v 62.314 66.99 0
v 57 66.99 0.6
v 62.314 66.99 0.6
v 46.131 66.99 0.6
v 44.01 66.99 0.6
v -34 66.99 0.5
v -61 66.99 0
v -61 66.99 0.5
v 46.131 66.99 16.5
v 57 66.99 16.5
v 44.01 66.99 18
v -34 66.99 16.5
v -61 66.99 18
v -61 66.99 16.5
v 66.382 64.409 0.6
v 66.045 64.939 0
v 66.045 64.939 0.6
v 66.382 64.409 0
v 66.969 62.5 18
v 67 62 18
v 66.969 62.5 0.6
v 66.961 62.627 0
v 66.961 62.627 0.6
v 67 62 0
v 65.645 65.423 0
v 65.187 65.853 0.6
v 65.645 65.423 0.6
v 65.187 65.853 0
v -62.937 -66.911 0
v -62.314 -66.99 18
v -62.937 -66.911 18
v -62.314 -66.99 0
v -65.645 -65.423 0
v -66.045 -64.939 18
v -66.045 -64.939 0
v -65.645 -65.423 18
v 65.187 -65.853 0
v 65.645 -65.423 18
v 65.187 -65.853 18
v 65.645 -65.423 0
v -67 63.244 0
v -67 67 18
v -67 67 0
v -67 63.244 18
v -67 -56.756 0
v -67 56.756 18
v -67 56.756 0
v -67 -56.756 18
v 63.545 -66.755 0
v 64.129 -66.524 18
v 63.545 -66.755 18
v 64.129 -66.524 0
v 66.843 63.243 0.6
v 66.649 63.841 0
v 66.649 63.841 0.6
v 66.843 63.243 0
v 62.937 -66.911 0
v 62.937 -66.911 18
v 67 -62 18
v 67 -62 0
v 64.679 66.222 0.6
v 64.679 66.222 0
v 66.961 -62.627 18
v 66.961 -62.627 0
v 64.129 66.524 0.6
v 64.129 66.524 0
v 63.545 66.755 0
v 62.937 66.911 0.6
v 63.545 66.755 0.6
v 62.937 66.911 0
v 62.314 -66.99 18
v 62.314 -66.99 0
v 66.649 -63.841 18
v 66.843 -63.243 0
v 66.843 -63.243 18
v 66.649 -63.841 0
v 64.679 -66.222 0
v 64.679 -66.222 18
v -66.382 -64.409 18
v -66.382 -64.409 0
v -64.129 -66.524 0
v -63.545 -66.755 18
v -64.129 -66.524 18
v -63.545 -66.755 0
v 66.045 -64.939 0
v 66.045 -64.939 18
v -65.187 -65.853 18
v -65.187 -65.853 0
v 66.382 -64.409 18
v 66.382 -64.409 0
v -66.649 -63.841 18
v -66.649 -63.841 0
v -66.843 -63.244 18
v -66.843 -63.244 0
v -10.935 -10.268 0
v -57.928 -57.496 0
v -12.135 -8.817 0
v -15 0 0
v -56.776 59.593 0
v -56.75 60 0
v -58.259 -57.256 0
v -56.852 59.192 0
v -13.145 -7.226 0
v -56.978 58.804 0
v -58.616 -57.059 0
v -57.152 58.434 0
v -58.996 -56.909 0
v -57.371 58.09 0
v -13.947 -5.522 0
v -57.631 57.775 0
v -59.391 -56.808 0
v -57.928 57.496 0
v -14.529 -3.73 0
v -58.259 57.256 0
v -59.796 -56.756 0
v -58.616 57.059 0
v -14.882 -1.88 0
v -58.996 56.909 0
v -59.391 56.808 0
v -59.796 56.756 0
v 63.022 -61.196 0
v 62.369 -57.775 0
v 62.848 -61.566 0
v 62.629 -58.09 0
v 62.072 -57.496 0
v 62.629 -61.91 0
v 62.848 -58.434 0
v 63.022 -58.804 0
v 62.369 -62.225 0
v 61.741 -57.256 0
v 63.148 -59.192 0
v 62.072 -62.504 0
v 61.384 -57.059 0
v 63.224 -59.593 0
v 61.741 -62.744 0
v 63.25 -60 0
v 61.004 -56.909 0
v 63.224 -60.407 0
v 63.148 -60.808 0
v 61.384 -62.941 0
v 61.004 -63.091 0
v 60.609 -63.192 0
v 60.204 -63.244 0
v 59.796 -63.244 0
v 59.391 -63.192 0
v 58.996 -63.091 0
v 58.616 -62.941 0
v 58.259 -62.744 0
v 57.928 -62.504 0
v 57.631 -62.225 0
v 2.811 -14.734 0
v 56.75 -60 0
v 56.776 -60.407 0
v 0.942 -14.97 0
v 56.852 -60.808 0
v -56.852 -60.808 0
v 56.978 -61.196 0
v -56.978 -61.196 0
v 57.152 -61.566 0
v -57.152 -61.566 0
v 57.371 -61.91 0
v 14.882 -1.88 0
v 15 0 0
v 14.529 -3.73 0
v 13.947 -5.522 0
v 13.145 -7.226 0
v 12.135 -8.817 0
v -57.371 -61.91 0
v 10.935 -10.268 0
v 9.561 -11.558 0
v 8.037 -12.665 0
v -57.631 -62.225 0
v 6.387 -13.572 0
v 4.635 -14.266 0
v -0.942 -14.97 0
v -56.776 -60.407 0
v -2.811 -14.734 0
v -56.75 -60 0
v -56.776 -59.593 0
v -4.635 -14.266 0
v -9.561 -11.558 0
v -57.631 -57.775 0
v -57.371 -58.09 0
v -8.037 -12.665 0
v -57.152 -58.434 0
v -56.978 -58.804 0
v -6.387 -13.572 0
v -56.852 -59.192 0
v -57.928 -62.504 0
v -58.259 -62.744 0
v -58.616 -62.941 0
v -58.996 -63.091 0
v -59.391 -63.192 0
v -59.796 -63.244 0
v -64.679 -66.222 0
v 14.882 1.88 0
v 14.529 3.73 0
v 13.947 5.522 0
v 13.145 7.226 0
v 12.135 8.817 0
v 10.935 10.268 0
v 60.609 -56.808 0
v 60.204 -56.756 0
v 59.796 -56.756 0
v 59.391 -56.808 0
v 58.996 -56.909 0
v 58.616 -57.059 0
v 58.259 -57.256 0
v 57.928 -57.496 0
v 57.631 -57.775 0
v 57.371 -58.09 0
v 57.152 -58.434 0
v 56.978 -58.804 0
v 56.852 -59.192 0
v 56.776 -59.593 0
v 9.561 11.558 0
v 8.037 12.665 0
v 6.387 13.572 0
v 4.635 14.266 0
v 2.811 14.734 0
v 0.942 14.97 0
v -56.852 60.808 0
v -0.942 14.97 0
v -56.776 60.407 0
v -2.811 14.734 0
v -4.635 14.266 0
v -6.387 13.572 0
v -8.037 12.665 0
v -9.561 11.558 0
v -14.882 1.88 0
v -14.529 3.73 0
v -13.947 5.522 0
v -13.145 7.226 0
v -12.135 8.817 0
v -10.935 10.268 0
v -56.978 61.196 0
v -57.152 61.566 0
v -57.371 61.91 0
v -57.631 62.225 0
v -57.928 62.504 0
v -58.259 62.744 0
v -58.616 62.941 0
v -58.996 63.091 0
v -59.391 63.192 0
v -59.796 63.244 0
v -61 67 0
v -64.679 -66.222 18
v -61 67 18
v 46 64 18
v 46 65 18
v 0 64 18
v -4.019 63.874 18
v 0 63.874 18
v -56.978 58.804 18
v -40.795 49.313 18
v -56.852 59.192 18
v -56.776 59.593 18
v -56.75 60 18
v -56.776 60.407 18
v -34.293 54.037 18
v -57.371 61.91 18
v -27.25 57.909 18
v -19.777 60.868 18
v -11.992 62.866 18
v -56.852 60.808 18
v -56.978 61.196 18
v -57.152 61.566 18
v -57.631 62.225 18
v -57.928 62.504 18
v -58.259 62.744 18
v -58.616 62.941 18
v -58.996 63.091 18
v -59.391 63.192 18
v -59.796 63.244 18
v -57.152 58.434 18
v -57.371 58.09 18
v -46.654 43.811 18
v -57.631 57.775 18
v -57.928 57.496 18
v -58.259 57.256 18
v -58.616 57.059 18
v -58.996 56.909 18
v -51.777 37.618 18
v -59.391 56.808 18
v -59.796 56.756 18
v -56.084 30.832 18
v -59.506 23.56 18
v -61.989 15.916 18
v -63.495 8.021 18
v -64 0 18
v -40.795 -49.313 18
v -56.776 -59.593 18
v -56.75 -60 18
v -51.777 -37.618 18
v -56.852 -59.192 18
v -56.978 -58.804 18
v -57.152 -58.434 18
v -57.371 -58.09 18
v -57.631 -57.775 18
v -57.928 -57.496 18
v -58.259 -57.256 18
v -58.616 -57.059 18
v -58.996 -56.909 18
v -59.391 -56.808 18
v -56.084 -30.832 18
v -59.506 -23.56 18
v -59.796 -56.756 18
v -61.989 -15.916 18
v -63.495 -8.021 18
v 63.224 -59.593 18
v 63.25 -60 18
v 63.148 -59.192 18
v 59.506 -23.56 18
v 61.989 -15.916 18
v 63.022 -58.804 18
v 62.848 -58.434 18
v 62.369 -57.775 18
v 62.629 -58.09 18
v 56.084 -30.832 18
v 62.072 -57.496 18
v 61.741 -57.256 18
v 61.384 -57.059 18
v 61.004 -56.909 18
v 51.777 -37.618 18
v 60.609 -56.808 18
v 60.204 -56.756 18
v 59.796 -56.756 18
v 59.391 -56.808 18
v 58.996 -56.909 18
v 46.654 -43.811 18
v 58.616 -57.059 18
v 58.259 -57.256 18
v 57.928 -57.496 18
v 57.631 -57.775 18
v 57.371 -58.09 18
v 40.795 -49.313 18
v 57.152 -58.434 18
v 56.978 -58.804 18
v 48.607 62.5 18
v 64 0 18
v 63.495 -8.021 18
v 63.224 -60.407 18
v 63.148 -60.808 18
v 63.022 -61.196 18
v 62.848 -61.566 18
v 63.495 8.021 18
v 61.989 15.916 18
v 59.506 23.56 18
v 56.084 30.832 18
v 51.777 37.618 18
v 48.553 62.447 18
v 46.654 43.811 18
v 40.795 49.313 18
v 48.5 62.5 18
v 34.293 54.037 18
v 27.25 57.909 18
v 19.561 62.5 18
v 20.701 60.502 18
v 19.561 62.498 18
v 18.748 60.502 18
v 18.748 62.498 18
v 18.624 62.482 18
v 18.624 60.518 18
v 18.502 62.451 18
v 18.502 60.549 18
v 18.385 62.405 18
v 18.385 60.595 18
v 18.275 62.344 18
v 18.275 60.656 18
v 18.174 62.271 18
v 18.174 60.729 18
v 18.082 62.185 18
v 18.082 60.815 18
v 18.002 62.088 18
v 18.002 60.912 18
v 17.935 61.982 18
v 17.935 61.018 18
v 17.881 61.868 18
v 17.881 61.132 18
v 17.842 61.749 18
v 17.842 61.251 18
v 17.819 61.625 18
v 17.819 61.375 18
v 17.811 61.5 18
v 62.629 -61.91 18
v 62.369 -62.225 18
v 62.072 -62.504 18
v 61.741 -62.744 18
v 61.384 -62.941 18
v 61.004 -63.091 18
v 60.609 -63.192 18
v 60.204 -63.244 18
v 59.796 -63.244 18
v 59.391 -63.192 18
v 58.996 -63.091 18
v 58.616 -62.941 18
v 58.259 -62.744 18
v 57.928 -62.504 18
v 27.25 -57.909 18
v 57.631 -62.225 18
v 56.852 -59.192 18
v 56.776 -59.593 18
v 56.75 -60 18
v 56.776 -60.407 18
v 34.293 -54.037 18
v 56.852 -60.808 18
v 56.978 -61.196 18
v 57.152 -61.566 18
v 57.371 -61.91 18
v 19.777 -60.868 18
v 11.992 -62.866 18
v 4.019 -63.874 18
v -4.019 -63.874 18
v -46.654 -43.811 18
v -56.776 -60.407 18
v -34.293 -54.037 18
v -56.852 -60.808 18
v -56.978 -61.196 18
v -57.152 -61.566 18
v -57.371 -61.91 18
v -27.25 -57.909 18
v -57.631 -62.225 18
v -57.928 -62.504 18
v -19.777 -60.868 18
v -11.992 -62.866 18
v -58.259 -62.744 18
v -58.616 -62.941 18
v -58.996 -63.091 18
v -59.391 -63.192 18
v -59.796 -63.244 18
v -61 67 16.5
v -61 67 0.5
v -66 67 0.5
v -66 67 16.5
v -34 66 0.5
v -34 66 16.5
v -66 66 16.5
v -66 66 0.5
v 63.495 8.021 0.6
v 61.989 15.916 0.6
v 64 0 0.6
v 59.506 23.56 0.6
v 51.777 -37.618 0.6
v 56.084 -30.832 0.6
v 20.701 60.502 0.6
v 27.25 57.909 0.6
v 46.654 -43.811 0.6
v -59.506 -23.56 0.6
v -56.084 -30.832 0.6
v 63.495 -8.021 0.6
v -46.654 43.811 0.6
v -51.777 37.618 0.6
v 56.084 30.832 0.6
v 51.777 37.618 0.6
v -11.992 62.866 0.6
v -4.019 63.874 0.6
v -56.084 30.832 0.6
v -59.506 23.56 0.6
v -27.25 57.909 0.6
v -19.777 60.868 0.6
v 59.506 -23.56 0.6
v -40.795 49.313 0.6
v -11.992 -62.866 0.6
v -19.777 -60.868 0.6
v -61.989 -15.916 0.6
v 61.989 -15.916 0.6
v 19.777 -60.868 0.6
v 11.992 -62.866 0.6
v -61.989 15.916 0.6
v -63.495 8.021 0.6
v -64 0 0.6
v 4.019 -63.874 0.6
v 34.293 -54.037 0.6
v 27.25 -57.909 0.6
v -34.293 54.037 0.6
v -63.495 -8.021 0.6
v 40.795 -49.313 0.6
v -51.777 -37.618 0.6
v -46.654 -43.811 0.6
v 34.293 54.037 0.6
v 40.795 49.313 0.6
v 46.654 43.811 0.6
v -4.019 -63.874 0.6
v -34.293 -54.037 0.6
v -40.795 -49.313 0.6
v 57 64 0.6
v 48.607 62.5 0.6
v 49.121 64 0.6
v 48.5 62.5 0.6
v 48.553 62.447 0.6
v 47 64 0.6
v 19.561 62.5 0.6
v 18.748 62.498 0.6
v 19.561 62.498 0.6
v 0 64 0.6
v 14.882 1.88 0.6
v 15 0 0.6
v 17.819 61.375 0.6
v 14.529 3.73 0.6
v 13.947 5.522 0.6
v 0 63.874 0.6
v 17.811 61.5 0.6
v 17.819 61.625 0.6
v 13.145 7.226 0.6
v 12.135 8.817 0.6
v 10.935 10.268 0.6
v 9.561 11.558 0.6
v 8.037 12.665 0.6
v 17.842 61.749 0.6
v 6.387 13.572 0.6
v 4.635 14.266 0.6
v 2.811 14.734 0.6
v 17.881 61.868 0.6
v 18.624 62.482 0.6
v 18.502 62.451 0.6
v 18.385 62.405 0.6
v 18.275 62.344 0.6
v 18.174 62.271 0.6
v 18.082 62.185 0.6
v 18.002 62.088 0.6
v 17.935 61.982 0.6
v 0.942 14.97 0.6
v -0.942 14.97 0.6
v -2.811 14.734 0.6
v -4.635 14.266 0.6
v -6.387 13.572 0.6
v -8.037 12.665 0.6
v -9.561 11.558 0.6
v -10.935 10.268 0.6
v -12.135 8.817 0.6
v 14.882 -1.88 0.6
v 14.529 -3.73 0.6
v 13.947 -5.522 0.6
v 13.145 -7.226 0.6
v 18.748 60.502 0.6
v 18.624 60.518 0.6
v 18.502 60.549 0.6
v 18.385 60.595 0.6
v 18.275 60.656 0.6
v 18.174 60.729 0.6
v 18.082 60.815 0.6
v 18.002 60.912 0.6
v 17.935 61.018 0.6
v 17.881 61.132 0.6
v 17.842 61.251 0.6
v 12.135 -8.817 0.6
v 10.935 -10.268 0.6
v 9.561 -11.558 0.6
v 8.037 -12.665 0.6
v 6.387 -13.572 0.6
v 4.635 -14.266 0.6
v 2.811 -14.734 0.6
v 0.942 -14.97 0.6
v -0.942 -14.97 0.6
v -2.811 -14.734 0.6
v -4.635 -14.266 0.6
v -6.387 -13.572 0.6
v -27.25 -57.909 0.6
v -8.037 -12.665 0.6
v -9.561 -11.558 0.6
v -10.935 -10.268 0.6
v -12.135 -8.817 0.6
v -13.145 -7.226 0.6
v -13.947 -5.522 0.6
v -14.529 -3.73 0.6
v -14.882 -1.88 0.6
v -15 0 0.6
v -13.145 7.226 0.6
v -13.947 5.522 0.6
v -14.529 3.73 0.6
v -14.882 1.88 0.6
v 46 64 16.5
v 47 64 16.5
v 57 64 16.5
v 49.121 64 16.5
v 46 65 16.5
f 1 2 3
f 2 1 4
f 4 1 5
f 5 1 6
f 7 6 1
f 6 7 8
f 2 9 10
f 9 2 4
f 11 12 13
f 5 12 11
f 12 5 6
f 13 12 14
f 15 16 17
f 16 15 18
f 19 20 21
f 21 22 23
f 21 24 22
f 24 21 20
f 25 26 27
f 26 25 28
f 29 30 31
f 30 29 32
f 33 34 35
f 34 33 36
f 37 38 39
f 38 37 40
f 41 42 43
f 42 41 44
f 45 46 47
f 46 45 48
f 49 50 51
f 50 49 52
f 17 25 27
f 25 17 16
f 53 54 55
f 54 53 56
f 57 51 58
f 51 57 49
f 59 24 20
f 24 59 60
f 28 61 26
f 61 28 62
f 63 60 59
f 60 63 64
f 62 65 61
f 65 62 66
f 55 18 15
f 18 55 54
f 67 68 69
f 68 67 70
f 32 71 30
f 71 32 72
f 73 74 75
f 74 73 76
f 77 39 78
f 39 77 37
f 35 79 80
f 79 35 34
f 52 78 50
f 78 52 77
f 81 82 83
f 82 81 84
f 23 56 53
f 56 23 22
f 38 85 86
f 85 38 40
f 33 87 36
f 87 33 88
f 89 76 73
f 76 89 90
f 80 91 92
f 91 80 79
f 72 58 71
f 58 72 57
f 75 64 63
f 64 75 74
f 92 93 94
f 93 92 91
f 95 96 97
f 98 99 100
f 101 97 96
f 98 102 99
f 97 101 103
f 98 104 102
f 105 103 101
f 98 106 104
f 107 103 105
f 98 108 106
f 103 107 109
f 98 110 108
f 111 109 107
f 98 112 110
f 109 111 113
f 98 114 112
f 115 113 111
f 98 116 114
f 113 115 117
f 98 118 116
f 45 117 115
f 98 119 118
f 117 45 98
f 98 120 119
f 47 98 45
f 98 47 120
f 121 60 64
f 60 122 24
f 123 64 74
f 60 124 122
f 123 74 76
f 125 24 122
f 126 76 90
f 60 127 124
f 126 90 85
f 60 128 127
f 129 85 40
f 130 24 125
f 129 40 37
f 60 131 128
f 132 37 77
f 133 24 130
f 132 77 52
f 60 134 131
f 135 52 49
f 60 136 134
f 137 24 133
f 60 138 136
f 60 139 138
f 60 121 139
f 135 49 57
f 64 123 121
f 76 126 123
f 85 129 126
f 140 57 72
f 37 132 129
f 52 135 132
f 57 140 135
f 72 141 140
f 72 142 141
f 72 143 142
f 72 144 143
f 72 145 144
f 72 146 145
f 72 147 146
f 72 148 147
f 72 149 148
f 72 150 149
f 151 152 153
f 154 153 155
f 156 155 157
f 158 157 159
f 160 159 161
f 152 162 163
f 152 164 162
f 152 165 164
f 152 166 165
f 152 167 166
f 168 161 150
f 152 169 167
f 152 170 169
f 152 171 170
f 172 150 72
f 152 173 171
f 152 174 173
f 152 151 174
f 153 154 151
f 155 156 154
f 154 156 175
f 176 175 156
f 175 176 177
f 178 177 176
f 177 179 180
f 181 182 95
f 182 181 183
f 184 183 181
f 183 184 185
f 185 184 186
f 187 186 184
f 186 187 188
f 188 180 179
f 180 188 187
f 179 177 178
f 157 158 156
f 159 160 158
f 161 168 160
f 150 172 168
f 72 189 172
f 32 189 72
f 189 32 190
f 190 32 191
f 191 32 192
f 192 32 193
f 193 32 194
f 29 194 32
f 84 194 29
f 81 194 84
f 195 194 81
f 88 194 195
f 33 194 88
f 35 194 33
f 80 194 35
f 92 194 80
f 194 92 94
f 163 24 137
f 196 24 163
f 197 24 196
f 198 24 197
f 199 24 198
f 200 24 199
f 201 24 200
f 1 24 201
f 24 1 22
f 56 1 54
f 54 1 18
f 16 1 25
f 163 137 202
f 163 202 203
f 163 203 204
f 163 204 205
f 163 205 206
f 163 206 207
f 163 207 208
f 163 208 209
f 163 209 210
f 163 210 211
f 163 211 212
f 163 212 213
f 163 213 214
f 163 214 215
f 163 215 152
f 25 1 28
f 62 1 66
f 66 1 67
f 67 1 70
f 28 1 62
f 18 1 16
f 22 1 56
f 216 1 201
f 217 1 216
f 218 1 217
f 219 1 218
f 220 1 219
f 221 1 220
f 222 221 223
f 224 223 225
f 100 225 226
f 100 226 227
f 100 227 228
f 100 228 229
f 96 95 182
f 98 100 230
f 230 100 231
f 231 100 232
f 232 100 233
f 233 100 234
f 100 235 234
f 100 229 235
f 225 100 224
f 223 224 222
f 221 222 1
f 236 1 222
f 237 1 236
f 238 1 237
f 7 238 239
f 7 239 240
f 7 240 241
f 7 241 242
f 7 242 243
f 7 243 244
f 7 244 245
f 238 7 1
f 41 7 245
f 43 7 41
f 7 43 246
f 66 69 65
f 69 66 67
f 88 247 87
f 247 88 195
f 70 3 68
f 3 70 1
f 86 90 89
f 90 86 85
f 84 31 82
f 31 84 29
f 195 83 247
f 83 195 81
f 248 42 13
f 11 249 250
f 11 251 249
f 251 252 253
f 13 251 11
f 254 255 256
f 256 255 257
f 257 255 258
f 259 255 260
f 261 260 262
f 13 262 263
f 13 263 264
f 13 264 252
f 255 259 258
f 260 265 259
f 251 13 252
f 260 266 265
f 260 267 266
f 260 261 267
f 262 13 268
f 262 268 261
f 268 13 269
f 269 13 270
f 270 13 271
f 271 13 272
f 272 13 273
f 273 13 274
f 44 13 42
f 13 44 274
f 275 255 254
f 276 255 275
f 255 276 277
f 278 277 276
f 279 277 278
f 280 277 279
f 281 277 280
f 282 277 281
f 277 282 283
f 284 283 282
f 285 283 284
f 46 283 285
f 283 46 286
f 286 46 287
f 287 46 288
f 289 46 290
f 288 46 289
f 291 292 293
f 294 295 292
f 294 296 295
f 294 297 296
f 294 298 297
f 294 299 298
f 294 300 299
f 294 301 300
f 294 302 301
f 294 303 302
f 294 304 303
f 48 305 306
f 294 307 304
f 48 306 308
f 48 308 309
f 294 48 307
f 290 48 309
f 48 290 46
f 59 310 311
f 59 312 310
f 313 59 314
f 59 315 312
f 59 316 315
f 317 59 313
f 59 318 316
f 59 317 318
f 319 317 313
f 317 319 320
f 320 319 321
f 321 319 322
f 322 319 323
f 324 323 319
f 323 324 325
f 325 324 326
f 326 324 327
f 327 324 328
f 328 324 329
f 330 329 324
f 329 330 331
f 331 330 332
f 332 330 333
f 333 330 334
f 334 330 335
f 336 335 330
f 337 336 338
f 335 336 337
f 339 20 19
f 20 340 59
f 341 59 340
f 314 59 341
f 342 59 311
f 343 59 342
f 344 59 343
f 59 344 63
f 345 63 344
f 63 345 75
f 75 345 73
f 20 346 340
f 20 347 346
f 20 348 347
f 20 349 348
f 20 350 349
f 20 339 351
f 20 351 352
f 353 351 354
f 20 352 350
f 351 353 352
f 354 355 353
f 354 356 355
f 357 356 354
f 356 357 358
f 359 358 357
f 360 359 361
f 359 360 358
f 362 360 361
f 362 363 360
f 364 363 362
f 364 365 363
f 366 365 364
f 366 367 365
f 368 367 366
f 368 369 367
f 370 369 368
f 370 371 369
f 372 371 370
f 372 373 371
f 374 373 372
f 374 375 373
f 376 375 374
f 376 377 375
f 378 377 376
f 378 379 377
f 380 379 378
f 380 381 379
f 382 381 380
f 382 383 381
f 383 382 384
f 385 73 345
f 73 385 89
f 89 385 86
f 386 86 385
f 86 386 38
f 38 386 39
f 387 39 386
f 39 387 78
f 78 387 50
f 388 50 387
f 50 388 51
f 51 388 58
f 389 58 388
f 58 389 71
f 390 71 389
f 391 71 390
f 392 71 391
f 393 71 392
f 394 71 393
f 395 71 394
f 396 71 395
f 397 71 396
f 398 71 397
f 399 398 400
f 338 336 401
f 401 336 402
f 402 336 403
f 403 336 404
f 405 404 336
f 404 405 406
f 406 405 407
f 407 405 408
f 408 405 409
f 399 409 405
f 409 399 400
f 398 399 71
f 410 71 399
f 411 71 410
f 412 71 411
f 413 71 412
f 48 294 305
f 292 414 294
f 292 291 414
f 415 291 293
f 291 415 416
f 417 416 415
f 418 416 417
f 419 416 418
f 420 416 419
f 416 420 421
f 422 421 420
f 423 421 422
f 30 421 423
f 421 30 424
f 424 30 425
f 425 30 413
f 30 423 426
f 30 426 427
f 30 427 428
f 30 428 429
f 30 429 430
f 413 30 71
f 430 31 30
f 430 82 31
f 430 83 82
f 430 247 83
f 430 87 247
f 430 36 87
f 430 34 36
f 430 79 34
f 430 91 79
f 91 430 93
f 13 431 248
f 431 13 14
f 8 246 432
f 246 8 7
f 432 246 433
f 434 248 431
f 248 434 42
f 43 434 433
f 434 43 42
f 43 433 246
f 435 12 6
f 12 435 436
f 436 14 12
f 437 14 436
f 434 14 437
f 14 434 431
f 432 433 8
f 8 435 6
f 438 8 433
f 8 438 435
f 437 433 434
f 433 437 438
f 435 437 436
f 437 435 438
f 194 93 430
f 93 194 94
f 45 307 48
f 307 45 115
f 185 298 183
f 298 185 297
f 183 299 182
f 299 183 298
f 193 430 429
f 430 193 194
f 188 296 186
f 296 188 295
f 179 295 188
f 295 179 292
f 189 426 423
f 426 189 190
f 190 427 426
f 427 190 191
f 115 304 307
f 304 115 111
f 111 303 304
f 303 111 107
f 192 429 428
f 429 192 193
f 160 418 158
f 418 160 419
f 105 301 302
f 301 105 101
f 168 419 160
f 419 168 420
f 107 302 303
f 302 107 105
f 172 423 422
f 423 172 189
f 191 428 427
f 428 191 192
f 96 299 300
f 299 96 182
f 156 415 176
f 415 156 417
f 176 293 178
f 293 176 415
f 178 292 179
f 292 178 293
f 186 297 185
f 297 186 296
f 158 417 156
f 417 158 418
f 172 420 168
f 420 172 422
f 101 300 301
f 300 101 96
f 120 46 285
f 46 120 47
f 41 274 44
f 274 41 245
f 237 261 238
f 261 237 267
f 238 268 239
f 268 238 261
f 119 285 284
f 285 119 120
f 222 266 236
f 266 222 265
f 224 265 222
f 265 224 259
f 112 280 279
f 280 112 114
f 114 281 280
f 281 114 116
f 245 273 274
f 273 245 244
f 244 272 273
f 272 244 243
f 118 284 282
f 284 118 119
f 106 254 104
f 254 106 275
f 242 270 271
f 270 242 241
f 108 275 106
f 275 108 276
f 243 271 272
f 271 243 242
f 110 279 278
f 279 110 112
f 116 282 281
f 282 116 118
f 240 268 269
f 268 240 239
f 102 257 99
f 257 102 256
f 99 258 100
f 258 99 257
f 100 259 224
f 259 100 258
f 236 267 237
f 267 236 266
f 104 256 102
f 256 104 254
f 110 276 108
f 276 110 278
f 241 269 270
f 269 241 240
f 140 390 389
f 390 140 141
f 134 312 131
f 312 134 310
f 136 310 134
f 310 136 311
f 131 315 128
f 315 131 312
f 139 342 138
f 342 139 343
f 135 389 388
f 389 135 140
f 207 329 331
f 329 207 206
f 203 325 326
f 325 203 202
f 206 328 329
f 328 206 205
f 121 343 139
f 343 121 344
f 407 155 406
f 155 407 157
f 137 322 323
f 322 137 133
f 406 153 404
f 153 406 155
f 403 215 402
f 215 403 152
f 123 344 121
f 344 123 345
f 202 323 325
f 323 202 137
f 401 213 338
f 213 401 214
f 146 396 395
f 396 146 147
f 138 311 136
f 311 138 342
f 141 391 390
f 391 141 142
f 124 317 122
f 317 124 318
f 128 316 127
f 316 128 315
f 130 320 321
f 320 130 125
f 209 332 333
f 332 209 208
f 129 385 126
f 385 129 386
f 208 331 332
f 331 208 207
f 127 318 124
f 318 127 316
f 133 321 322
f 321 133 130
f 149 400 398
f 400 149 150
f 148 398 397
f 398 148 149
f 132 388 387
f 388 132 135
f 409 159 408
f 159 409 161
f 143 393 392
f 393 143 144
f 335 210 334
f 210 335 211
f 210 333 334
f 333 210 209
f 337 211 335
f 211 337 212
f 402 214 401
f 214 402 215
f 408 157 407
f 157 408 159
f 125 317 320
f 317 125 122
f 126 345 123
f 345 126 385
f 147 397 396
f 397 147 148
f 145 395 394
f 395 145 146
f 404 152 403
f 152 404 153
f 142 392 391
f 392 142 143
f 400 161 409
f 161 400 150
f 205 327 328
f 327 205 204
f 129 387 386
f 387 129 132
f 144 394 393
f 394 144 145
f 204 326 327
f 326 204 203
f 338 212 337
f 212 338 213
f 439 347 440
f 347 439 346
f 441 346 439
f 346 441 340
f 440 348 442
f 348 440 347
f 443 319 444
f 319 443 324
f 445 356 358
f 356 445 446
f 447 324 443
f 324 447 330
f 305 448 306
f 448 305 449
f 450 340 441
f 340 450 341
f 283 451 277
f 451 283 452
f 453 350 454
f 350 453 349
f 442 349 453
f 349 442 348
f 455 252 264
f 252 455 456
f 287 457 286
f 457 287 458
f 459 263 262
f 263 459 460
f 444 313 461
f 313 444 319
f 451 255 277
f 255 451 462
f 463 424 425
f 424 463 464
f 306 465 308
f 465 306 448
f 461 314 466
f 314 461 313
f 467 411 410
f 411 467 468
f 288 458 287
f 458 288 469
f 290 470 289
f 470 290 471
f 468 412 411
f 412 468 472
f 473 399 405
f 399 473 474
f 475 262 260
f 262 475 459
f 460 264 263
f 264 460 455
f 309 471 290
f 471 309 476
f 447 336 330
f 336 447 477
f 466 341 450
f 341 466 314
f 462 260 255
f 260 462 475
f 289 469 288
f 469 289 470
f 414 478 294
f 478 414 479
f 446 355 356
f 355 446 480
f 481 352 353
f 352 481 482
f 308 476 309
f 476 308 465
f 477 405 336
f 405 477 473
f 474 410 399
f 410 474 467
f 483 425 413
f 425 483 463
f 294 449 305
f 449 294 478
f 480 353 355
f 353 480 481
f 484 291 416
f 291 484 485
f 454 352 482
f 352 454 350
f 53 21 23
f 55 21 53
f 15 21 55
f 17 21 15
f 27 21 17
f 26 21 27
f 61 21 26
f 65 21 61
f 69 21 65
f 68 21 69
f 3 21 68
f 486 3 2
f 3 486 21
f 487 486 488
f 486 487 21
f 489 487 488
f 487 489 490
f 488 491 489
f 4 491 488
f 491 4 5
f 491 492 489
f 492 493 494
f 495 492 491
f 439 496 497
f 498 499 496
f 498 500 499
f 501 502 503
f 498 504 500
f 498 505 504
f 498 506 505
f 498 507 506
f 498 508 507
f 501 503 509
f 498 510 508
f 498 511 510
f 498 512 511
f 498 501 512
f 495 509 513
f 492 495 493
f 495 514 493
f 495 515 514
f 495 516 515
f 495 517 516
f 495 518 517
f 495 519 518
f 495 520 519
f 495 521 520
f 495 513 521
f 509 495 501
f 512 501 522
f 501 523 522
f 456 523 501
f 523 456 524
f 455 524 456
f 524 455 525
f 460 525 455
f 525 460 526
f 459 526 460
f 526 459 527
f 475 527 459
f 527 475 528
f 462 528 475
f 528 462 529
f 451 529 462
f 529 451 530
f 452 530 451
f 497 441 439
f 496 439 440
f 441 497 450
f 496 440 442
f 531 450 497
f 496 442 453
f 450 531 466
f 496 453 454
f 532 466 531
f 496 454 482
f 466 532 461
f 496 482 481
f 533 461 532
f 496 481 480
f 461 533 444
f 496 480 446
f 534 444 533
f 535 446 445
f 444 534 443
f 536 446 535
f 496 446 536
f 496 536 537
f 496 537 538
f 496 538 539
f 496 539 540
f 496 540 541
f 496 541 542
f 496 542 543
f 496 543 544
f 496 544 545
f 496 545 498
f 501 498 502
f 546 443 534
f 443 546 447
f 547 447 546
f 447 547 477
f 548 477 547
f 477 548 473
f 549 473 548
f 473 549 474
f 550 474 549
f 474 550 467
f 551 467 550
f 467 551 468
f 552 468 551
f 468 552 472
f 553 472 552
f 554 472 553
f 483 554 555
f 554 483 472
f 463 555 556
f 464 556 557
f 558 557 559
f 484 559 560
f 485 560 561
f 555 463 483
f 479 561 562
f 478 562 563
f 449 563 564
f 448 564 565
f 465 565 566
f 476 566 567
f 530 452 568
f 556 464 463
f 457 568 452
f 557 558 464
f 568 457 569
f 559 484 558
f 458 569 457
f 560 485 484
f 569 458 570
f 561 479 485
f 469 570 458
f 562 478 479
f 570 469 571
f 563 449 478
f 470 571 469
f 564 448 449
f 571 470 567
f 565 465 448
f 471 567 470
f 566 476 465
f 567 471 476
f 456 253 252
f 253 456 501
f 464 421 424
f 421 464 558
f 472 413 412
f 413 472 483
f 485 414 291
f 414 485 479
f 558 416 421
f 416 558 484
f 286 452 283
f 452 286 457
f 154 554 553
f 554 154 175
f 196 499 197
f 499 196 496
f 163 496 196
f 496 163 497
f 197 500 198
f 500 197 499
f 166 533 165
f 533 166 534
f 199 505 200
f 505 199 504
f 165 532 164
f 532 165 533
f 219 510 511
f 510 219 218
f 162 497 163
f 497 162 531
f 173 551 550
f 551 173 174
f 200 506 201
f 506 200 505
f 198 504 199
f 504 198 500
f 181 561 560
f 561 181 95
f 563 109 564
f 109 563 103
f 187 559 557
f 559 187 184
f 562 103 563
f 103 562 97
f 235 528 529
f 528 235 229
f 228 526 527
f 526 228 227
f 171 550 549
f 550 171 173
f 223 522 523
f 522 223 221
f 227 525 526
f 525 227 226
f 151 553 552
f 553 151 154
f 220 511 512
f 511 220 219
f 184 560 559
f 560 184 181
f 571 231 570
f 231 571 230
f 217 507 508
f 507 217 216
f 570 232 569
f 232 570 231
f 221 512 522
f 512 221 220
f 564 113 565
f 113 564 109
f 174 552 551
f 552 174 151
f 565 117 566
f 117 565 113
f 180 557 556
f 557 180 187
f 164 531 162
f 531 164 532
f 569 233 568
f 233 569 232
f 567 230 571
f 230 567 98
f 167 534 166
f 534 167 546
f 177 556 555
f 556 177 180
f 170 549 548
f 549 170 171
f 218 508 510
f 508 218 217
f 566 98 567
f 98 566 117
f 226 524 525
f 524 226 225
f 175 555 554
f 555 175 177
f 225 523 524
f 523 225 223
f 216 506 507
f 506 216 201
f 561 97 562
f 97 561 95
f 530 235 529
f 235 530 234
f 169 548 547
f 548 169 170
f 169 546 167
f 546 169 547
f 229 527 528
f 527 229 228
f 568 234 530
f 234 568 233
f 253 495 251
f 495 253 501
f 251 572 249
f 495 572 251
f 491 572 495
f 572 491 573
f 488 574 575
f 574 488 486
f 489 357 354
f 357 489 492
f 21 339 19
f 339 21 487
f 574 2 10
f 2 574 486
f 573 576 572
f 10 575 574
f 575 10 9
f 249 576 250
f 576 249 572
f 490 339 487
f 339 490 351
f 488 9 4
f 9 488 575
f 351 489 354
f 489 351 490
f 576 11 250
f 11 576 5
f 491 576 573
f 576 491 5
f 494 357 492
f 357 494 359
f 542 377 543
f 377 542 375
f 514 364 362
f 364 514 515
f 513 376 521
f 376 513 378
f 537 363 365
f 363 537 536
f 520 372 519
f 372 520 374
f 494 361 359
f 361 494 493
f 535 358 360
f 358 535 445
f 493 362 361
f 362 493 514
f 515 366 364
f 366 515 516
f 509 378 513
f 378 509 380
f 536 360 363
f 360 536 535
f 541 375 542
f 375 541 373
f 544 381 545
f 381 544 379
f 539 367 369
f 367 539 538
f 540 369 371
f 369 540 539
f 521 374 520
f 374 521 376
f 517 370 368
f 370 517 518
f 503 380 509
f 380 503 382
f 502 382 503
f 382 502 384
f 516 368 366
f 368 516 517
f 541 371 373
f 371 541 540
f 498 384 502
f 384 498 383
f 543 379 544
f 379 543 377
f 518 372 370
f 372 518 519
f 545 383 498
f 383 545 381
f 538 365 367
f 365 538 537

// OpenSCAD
$fn = 50;


union() {
	difference() {
		union() {
			translate(v = [0, 0, 0]) {
				rotate(a = [0, 0, 0]) {
					hull() {
						translate(v = [-62.0000000000, 62.0000000000, 0]) {
							rotate(a = [0, 0, 0]) {
								translate(v = [0, 0, 0]) {
									rotate(a = [0, 0, 0]) {
										cylinder(h = 18, r = 5);
									}
								}
							}
						}
						translate(v = [62.0000000000, 62.0000000000, 0]) {
							rotate(a = [0, 0, 0]) {
								translate(v = [0, 0, 0]) {
									rotate(a = [0, 0, 0]) {
										cylinder(h = 18, r = 5);
									}
								}
							}
						}
						translate(v = [-62.0000000000, -62.0000000000, 0]) {
							rotate(a = [0, 0, 0]) {
								translate(v = [0, 0, 0]) {
									rotate(a = [0, 0, 0]) {
										cylinder(h = 18, r = 5);
									}
								}
							}
						}
						translate(v = [62.0000000000, -62.0000000000, 0]) {
							rotate(a = [0, 0, 0]) {
								translate(v = [0, 0, 0]) {
									rotate(a = [0, 0, 0]) {
										cylinder(h = 18, r = 5);
									}
								}
							}
						}
					}
				}
			}
			translate(v = [-67.0000000000, 61.0000000000, 0]) {
				rotate(a = [0, 0, 0]) {
					cube(size = [6, 6, 18]);
				}
			}
		}
		union() {
			#translate(v = [-66.0000000000, 66.0000000000, 0.5000000000]) {
				rotate(a = [0, 0, 0]) {
					cube(size = [32, 1, 16]);
				}
			}
			translate(v = [-67.5000000000, -60.0000000000, -125]) {
				rotate(a = [0, 0, 0]) {
					hull() {
						translate(v = [7.5000000000, 0, 0]) {
							rotate(a = [0, 0, 0]) {
								translate(v = [0, 0, 0]) {
									rotate(a = [0, 0, 0]) {
										cylinder(h = 250, r = 3.2500000000);
									}
								}
							}
						}
						translate(v = [-7.5000000000, 0, 0]) {
							rotate(a = [0, 0, 0]) {
								translate(v = [0, 0, 0]) {
									rotate(a = [0, 0, 0]) {
										cylinder(h = 250, r = 3.2500000000);
									}
								}
							}
						}
					}
				}
			}
			translate(v = [-67.5000000000, 60.0000000000, -125]) {
				rotate(a = [0, 0, 0]) {
					hull() {
						translate(v = [7.5000000000, 0, 0]) {
							rotate(a = [0, 0, 0]) {
								translate(v = [0, 0, 0]) {
									rotate(a = [0, 0, 0]) {
										cylinder(h = 250, r = 3.2500000000);
									}
								}
							}
						}
						translate(v = [-7.5000000000, 0, 0]) {
							rotate(a = [0, 0, 0]) {
								translate(v = [0, 0, 0]) {
									rotate(a = [0, 0, 0]) {
										cylinder(h = 250, r = 3.2500000000);
									}
								}
							}
						}
					}
				}
			}
			translate(v = [60.0000000000, -60.0000000000, -125.0000000000]) {
				rotate(a = [0, 0, 0]) {
					cylinder(h = 250, r = 3.2500000000);
				}
			}
			translate(v = [0, 0, 0.6000000000]) {
				rotate(a = [0, 0, 0]) {
					cylinder(h = 20.4000000000, r = 64.0000000000);
				}
			}
			translate(v = [0, 0, -9.0000000000]) {
				rotate(a = [0, 0, 0]) {
					cylinder(h = 18, r = 15.0000000000);
				}
			}
			translate(v = [0.0000000000, 62.5000000000, 0.6000000000]) {
				rotate(a = [0, 0, 0]) {
					cube(size = [67.0000000000, 1.5000000000, 20.4000000000]);
				}
			}
			translate(v = [57.0000000000, 62.5000000000, 0.6000000000]) {
				rotate(a = [0, 0, 0]) {
					cube(size = [10, 4.5000000000, 20.4000000000]);
				}
			}
			translate(v = [46.0000000000, 62.5000000000, 16.5000000000]) {
				rotate(a = [0, 0, 0]) {
					cube(size = [21, 4.5000000000, 1.5000000000]);
				}
			}
			translate(v = [43.2500000000, 67.7500000000, 0.6000000000]) {
				rotate(a = [0, 0, -45]) {
					cube(size = [7.5000000000, 1.5000000000, 20.4000000000]);
				}
			}
			translate(v = [12.0610000000, 60.5000000000, 0.6000000000]) {
				rotate(a = [0, 0, 0]) {
					cube(size = [7.5000000000, 2, 17.4000000000]);
				}
			}
		}
	}
	union() {
		translate(v = [21.3110000000, 61.5000000000, 0]) {
			rotate(a = [0, 0, 0]) {
				hull() {
					translate(v = [2.5000000000, 0, 0]) {
						rotate(a = [0, 0, 0]) {
							#translate(v = [0, 0, 0]) {
								rotate(a = [0, 0, 0]) {
									cylinder(h = 18, r = 1.0000000000);
								}
							}
						}
					}
					translate(v = [-2.5000000000, 0, 0]) {
						rotate(a = [0, 0, 0]) {
							#translate(v = [0, 0, 0]) {
								rotate(a = [0, 0, 0]) {
									cylinder(h = 18, r = 1.0000000000);
								}
							}
						}
					}
				}
			}
		}
	}
}
